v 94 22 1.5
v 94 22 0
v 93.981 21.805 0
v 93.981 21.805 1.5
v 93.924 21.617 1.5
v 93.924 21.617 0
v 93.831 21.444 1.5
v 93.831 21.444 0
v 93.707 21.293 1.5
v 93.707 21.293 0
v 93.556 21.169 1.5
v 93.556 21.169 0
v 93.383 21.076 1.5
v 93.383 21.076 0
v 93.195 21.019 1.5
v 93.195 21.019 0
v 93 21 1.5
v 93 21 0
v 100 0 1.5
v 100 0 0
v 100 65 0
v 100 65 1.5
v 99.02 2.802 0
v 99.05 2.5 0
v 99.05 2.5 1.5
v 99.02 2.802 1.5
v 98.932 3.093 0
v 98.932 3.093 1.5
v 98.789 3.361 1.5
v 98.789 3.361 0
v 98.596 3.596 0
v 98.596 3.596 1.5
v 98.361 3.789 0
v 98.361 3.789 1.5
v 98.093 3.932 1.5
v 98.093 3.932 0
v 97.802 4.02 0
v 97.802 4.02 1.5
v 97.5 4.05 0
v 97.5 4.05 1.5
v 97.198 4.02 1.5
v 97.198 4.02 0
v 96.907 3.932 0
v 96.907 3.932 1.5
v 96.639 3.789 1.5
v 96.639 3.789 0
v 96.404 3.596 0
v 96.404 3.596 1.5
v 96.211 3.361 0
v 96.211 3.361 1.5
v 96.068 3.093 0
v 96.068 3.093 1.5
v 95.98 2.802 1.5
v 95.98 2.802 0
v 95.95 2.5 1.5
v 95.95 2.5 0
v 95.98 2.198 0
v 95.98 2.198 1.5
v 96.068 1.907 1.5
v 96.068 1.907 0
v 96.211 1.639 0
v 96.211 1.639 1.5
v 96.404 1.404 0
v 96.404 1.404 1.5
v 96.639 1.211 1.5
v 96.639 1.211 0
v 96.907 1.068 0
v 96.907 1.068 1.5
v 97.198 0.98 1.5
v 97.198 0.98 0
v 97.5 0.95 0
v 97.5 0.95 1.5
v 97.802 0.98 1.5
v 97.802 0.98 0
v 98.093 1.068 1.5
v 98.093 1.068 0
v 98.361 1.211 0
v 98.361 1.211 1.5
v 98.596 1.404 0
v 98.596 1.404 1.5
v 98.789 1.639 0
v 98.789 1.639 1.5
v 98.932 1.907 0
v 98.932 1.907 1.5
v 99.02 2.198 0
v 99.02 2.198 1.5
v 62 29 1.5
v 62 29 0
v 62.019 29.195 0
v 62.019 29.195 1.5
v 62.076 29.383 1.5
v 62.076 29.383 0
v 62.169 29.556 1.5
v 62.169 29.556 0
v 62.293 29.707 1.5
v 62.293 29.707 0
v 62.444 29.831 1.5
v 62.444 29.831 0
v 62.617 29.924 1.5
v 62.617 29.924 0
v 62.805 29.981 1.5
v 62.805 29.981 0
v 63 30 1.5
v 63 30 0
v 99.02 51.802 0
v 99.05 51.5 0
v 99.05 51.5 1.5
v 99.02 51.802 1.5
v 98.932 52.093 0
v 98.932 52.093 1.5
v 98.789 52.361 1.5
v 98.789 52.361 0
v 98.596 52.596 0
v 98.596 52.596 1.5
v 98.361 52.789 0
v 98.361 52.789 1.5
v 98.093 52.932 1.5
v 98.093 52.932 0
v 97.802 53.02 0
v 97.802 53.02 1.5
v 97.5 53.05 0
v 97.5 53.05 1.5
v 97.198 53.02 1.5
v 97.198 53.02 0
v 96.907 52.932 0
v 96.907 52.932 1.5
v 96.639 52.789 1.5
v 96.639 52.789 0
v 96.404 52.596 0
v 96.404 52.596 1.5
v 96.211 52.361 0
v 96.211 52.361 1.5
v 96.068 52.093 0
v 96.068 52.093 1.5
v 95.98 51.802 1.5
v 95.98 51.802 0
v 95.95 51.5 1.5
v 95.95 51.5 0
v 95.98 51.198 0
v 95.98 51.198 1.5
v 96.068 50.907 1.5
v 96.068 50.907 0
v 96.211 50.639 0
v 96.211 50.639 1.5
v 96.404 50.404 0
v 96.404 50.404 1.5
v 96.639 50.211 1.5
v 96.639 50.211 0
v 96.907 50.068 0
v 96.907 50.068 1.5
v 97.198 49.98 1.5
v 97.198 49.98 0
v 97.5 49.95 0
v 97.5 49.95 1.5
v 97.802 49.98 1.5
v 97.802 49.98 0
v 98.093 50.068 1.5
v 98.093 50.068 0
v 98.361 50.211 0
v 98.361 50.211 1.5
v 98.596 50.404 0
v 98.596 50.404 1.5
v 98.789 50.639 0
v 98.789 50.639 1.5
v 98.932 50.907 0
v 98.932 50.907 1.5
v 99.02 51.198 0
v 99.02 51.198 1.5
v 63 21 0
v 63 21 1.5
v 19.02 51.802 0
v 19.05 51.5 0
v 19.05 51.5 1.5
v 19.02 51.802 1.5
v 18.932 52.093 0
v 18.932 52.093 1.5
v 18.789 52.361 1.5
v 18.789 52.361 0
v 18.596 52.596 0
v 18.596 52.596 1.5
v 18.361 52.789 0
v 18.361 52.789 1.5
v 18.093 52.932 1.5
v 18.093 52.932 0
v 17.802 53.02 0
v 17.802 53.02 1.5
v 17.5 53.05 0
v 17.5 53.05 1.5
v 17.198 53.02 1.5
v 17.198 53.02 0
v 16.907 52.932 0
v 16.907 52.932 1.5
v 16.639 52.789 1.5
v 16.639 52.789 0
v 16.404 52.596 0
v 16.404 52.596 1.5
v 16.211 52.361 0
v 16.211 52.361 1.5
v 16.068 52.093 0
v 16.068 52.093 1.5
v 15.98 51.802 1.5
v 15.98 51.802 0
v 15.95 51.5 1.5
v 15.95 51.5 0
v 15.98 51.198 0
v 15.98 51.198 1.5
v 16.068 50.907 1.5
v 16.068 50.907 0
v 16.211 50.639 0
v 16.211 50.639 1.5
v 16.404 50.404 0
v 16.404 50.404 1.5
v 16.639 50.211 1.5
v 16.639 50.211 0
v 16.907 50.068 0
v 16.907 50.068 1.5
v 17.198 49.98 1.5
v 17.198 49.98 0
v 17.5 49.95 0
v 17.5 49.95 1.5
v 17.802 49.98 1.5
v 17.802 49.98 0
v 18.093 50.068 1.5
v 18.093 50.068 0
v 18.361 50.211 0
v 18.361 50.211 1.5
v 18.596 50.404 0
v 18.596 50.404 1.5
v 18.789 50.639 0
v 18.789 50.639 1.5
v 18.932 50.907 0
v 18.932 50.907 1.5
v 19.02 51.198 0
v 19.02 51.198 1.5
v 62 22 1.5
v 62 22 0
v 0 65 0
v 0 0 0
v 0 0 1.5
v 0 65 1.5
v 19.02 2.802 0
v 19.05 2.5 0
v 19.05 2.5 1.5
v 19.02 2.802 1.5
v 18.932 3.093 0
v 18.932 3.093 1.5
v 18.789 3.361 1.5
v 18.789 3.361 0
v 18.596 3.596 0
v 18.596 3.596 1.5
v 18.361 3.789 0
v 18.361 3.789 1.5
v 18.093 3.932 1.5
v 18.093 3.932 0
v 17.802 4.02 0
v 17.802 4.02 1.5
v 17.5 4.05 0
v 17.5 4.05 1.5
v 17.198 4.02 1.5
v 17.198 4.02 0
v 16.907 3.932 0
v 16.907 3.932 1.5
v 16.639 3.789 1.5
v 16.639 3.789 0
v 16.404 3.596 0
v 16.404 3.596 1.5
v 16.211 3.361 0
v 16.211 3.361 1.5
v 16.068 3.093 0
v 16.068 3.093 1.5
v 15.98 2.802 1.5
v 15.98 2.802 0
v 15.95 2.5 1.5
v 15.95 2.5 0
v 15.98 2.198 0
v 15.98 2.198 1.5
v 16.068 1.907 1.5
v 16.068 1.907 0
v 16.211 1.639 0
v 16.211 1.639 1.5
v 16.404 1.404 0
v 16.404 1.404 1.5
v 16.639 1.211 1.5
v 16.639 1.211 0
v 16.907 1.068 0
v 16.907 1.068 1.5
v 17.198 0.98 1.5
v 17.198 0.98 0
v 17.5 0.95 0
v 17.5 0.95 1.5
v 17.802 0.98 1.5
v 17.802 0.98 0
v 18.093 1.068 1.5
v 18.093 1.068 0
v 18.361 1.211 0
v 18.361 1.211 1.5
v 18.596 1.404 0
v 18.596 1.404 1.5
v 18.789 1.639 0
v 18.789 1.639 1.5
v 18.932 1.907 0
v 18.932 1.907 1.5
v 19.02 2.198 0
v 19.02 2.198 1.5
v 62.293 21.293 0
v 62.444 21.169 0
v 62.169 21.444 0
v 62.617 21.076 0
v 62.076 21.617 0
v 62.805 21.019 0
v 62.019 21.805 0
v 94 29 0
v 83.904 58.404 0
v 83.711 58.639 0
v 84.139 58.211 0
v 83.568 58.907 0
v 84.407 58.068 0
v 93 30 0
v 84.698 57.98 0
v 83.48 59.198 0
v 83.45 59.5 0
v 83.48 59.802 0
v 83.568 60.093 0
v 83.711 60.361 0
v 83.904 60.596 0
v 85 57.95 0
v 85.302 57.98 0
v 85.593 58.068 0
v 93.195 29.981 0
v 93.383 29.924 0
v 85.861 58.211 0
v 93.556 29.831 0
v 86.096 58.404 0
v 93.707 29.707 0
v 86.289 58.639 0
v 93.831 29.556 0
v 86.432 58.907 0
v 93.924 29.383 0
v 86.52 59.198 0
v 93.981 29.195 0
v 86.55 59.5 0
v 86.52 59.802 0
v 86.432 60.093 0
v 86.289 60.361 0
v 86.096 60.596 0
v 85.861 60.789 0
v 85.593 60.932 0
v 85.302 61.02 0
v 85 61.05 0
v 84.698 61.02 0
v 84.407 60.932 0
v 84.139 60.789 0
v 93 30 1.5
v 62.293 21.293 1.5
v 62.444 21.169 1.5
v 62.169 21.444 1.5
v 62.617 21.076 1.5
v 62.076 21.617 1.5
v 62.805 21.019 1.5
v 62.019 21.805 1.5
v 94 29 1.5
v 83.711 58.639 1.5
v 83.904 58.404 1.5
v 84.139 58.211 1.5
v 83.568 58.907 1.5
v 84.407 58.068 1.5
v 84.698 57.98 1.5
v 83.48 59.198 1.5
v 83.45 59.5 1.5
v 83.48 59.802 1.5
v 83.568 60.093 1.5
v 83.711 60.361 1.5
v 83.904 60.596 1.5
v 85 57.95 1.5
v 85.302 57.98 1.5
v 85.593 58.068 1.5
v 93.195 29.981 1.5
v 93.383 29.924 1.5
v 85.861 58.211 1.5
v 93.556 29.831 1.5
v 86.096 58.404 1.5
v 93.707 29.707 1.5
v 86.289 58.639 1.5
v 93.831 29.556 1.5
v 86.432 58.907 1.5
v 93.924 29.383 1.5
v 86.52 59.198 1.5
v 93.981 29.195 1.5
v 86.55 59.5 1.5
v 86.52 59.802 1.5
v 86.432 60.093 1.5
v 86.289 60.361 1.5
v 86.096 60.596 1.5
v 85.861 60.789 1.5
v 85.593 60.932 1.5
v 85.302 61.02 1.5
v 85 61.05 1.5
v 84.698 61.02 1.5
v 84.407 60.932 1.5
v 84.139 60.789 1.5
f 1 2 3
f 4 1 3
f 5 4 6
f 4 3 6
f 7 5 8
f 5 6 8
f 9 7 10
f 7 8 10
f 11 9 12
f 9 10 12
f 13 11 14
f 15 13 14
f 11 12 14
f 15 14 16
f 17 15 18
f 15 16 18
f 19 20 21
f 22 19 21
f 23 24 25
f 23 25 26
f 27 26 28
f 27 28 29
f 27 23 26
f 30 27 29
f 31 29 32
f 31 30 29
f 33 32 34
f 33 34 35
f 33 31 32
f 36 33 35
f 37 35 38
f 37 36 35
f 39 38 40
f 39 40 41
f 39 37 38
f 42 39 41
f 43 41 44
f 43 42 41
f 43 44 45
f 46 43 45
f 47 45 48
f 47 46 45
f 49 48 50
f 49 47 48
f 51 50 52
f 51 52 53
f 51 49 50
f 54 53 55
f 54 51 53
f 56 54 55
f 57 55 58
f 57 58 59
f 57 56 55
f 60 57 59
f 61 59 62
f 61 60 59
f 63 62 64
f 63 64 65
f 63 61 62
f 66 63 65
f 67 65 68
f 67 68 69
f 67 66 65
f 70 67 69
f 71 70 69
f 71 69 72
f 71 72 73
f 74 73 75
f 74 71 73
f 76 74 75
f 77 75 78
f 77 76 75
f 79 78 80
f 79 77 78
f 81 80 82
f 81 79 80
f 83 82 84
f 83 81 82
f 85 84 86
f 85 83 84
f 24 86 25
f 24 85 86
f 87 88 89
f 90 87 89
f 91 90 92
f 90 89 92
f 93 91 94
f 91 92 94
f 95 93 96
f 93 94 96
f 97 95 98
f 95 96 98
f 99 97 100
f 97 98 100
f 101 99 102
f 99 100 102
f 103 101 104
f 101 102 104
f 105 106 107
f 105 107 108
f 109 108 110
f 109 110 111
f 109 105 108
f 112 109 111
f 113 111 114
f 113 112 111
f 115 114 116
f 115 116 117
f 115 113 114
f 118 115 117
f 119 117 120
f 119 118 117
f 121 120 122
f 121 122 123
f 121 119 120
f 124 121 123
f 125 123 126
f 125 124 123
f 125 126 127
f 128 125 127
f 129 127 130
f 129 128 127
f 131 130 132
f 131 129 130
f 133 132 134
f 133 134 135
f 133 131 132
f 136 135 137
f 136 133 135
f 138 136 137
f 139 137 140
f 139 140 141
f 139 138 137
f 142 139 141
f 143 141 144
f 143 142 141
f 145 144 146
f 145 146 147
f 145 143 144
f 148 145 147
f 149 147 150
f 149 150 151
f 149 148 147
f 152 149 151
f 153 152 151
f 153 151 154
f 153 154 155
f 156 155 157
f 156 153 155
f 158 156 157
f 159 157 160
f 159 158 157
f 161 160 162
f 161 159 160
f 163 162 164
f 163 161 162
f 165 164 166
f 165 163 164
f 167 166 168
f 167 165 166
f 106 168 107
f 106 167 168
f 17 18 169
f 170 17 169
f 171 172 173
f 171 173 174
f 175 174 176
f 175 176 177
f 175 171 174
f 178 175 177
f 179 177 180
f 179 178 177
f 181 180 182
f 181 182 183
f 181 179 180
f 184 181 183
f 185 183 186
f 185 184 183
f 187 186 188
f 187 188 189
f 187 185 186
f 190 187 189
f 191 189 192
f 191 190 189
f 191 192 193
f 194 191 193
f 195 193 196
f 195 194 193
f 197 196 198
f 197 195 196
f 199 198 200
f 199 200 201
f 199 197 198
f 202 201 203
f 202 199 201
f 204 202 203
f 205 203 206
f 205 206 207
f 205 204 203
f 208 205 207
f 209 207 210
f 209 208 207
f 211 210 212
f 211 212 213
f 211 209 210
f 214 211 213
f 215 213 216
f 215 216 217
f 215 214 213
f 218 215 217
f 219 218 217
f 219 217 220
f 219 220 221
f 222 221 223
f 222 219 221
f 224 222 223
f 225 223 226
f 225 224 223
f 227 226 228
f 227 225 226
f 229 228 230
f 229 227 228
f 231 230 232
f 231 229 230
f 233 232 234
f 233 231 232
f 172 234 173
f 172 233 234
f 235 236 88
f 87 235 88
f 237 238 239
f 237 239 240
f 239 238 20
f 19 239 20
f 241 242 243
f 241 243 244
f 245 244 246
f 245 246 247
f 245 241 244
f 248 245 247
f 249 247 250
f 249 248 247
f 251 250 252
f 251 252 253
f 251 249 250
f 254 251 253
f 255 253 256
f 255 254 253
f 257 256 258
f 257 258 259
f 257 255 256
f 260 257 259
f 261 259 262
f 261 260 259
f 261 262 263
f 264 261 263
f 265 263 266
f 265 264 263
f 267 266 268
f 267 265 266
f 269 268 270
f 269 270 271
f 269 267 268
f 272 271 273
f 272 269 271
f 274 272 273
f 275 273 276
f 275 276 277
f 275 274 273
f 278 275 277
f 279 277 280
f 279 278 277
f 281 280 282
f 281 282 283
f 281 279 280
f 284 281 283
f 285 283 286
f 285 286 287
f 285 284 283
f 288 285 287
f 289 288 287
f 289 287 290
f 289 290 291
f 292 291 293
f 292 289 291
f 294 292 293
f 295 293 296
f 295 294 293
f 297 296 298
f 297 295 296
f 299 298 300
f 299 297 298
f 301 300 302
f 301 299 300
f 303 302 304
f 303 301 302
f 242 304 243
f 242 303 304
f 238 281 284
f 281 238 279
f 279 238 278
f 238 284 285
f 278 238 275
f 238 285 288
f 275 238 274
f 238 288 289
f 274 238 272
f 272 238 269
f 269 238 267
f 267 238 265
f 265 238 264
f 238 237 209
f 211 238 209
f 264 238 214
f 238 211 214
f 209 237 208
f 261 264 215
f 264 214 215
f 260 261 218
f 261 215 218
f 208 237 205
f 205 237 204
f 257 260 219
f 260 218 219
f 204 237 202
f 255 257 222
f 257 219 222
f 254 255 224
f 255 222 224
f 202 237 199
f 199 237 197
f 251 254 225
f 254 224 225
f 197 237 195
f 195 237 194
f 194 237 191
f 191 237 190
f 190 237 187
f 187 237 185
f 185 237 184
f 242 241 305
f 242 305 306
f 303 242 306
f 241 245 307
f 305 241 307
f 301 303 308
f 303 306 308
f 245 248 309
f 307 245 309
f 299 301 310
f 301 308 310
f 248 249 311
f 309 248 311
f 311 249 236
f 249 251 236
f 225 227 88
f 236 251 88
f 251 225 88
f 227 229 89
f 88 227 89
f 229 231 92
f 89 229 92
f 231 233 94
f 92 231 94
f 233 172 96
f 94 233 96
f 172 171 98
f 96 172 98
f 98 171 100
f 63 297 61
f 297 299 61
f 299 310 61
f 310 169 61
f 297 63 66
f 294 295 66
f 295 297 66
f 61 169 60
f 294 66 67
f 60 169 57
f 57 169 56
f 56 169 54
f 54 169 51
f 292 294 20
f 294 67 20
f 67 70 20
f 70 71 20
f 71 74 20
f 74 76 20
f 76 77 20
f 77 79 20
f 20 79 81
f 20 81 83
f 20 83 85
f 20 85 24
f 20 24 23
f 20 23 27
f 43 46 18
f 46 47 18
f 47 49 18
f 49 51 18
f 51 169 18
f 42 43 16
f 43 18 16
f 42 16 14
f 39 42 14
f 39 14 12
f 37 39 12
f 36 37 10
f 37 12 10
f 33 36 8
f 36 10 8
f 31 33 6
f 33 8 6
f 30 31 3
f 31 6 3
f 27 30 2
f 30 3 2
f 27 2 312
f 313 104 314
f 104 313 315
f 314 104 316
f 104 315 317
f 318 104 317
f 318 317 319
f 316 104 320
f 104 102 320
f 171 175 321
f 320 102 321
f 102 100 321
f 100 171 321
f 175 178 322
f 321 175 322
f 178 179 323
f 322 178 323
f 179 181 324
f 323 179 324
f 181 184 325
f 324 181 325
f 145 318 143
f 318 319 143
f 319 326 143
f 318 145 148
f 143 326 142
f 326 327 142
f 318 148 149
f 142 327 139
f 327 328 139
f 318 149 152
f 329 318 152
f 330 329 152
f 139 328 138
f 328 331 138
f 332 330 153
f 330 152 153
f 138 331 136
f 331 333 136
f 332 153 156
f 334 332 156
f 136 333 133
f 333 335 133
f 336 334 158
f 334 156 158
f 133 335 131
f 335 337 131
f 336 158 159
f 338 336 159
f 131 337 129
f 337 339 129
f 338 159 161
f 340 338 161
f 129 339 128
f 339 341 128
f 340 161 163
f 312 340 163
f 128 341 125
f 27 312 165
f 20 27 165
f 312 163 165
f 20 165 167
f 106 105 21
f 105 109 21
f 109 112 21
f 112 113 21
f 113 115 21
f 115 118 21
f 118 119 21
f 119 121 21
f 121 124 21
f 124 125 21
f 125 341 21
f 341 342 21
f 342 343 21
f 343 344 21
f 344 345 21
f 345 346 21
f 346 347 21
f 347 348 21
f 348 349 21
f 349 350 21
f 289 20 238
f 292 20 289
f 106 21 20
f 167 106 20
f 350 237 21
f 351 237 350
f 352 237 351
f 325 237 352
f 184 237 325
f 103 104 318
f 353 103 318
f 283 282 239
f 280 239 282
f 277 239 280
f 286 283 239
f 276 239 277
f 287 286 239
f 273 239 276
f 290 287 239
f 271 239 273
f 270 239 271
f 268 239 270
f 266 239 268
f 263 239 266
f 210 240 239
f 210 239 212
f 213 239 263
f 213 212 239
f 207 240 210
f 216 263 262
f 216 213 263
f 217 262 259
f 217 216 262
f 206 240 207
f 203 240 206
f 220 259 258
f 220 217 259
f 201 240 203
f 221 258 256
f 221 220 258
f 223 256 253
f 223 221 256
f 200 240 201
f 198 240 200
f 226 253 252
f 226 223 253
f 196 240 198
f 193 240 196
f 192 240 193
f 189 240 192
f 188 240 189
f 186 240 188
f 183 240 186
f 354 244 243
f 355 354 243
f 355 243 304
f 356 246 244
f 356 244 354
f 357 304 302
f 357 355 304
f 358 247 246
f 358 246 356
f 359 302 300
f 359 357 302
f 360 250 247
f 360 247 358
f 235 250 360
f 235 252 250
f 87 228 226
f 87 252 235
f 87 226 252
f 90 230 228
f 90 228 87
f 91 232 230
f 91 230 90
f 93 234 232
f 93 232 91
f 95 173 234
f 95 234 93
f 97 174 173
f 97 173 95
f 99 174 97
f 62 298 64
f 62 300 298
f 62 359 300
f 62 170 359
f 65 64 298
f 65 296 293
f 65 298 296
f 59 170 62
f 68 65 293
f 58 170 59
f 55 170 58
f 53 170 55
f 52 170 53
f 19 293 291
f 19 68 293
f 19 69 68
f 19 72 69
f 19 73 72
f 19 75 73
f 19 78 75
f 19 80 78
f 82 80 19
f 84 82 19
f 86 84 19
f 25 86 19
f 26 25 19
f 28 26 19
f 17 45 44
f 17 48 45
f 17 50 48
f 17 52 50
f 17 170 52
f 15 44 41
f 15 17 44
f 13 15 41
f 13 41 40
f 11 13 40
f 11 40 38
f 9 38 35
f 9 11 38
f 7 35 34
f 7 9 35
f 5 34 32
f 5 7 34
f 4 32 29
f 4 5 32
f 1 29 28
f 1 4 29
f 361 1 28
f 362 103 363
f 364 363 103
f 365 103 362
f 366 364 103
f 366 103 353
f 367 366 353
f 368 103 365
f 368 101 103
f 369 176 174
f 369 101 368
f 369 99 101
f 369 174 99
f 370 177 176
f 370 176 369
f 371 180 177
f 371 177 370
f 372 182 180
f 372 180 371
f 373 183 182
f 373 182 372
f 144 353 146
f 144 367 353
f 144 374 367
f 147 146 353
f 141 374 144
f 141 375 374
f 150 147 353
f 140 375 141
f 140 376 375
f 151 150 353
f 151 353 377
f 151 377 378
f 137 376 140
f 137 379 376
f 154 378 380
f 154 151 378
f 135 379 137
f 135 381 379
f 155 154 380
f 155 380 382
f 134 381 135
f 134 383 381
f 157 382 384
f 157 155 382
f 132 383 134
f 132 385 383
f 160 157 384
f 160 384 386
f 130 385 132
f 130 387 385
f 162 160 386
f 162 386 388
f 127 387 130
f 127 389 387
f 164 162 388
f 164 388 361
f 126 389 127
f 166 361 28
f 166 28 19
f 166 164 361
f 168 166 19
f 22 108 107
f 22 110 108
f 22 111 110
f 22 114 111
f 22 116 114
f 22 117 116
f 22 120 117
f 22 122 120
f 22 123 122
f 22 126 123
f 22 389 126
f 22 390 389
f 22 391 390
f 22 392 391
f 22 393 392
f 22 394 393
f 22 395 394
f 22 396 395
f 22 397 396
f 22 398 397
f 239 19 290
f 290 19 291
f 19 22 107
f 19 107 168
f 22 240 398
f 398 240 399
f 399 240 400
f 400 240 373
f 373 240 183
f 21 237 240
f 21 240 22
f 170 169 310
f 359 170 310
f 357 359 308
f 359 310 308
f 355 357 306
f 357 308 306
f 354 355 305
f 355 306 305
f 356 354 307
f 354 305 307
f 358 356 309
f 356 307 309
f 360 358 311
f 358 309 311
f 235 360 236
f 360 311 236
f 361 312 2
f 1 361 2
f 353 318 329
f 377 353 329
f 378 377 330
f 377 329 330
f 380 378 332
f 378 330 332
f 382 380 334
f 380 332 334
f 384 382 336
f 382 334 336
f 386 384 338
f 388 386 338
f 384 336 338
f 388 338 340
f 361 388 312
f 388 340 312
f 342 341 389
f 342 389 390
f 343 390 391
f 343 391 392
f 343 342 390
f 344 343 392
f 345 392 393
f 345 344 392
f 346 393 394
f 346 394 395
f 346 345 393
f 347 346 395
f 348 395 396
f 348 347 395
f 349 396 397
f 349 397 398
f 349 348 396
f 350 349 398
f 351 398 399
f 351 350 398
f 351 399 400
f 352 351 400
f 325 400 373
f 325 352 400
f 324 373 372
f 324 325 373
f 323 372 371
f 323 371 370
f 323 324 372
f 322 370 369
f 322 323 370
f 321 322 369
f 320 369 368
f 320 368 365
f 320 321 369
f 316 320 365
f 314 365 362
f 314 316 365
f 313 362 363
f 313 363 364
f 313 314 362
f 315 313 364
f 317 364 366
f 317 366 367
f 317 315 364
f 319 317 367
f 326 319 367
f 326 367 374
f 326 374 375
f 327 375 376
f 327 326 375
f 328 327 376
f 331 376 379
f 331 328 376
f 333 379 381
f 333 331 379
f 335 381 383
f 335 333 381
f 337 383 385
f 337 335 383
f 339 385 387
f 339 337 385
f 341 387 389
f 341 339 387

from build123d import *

# Parameters (mm, degrees)
SKETCH_1_W      = 100
SKETCH_1_H      = 65
SKETCH_1_R      = 1.55
EXTRUDE_1_DEPTH = 1.5


with BuildPart() as part:
    # Эскиз1 → Бобышка-Вытянуть1 (new body)
    with BuildSketch(Plane.XY):
        with Locations((50, 32.5)):
            Rectangle(SKETCH_1_W, SKETCH_1_H)
        with Locations((17.5, 51.5)):
            Circle(SKETCH_1_R, mode=Mode.SUBTRACT)
        with Locations((97.5, 51.5)):
            Circle(SKETCH_1_R, mode=Mode.SUBTRACT)
        with Locations((97.5, 2.5)):
            Circle(SKETCH_1_R, mode=Mode.SUBTRACT)
        with Locations((17.5, 2.5)):
            Circle(SKETCH_1_R, mode=Mode.SUBTRACT)
        with Locations((85, 59.5)):
            Circle(SKETCH_1_R, mode=Mode.SUBTRACT)
        with BuildLine():
            Line((63, 30), (93, 30))
            ThreePointArc((93, 30), (93.707106781, 29.707106781), (94, 29))
            Line((94, 29), (94, 22))
            ThreePointArc((94, 22), (93.707106781, 21.292893219), (93, 21))
            Line((93, 21), (63, 21))
            ThreePointArc((63, 21), (62.292893219, 21.292893219), (62, 22))
            Line((62, 22), (62, 29))
            ThreePointArc((62, 29), (62.292893219, 29.707106781), (63, 30))
        make_face(mode=Mode.SUBTRACT)
    extrude(amount=EXTRUDE_1_DEPTH)


solid = part.part
